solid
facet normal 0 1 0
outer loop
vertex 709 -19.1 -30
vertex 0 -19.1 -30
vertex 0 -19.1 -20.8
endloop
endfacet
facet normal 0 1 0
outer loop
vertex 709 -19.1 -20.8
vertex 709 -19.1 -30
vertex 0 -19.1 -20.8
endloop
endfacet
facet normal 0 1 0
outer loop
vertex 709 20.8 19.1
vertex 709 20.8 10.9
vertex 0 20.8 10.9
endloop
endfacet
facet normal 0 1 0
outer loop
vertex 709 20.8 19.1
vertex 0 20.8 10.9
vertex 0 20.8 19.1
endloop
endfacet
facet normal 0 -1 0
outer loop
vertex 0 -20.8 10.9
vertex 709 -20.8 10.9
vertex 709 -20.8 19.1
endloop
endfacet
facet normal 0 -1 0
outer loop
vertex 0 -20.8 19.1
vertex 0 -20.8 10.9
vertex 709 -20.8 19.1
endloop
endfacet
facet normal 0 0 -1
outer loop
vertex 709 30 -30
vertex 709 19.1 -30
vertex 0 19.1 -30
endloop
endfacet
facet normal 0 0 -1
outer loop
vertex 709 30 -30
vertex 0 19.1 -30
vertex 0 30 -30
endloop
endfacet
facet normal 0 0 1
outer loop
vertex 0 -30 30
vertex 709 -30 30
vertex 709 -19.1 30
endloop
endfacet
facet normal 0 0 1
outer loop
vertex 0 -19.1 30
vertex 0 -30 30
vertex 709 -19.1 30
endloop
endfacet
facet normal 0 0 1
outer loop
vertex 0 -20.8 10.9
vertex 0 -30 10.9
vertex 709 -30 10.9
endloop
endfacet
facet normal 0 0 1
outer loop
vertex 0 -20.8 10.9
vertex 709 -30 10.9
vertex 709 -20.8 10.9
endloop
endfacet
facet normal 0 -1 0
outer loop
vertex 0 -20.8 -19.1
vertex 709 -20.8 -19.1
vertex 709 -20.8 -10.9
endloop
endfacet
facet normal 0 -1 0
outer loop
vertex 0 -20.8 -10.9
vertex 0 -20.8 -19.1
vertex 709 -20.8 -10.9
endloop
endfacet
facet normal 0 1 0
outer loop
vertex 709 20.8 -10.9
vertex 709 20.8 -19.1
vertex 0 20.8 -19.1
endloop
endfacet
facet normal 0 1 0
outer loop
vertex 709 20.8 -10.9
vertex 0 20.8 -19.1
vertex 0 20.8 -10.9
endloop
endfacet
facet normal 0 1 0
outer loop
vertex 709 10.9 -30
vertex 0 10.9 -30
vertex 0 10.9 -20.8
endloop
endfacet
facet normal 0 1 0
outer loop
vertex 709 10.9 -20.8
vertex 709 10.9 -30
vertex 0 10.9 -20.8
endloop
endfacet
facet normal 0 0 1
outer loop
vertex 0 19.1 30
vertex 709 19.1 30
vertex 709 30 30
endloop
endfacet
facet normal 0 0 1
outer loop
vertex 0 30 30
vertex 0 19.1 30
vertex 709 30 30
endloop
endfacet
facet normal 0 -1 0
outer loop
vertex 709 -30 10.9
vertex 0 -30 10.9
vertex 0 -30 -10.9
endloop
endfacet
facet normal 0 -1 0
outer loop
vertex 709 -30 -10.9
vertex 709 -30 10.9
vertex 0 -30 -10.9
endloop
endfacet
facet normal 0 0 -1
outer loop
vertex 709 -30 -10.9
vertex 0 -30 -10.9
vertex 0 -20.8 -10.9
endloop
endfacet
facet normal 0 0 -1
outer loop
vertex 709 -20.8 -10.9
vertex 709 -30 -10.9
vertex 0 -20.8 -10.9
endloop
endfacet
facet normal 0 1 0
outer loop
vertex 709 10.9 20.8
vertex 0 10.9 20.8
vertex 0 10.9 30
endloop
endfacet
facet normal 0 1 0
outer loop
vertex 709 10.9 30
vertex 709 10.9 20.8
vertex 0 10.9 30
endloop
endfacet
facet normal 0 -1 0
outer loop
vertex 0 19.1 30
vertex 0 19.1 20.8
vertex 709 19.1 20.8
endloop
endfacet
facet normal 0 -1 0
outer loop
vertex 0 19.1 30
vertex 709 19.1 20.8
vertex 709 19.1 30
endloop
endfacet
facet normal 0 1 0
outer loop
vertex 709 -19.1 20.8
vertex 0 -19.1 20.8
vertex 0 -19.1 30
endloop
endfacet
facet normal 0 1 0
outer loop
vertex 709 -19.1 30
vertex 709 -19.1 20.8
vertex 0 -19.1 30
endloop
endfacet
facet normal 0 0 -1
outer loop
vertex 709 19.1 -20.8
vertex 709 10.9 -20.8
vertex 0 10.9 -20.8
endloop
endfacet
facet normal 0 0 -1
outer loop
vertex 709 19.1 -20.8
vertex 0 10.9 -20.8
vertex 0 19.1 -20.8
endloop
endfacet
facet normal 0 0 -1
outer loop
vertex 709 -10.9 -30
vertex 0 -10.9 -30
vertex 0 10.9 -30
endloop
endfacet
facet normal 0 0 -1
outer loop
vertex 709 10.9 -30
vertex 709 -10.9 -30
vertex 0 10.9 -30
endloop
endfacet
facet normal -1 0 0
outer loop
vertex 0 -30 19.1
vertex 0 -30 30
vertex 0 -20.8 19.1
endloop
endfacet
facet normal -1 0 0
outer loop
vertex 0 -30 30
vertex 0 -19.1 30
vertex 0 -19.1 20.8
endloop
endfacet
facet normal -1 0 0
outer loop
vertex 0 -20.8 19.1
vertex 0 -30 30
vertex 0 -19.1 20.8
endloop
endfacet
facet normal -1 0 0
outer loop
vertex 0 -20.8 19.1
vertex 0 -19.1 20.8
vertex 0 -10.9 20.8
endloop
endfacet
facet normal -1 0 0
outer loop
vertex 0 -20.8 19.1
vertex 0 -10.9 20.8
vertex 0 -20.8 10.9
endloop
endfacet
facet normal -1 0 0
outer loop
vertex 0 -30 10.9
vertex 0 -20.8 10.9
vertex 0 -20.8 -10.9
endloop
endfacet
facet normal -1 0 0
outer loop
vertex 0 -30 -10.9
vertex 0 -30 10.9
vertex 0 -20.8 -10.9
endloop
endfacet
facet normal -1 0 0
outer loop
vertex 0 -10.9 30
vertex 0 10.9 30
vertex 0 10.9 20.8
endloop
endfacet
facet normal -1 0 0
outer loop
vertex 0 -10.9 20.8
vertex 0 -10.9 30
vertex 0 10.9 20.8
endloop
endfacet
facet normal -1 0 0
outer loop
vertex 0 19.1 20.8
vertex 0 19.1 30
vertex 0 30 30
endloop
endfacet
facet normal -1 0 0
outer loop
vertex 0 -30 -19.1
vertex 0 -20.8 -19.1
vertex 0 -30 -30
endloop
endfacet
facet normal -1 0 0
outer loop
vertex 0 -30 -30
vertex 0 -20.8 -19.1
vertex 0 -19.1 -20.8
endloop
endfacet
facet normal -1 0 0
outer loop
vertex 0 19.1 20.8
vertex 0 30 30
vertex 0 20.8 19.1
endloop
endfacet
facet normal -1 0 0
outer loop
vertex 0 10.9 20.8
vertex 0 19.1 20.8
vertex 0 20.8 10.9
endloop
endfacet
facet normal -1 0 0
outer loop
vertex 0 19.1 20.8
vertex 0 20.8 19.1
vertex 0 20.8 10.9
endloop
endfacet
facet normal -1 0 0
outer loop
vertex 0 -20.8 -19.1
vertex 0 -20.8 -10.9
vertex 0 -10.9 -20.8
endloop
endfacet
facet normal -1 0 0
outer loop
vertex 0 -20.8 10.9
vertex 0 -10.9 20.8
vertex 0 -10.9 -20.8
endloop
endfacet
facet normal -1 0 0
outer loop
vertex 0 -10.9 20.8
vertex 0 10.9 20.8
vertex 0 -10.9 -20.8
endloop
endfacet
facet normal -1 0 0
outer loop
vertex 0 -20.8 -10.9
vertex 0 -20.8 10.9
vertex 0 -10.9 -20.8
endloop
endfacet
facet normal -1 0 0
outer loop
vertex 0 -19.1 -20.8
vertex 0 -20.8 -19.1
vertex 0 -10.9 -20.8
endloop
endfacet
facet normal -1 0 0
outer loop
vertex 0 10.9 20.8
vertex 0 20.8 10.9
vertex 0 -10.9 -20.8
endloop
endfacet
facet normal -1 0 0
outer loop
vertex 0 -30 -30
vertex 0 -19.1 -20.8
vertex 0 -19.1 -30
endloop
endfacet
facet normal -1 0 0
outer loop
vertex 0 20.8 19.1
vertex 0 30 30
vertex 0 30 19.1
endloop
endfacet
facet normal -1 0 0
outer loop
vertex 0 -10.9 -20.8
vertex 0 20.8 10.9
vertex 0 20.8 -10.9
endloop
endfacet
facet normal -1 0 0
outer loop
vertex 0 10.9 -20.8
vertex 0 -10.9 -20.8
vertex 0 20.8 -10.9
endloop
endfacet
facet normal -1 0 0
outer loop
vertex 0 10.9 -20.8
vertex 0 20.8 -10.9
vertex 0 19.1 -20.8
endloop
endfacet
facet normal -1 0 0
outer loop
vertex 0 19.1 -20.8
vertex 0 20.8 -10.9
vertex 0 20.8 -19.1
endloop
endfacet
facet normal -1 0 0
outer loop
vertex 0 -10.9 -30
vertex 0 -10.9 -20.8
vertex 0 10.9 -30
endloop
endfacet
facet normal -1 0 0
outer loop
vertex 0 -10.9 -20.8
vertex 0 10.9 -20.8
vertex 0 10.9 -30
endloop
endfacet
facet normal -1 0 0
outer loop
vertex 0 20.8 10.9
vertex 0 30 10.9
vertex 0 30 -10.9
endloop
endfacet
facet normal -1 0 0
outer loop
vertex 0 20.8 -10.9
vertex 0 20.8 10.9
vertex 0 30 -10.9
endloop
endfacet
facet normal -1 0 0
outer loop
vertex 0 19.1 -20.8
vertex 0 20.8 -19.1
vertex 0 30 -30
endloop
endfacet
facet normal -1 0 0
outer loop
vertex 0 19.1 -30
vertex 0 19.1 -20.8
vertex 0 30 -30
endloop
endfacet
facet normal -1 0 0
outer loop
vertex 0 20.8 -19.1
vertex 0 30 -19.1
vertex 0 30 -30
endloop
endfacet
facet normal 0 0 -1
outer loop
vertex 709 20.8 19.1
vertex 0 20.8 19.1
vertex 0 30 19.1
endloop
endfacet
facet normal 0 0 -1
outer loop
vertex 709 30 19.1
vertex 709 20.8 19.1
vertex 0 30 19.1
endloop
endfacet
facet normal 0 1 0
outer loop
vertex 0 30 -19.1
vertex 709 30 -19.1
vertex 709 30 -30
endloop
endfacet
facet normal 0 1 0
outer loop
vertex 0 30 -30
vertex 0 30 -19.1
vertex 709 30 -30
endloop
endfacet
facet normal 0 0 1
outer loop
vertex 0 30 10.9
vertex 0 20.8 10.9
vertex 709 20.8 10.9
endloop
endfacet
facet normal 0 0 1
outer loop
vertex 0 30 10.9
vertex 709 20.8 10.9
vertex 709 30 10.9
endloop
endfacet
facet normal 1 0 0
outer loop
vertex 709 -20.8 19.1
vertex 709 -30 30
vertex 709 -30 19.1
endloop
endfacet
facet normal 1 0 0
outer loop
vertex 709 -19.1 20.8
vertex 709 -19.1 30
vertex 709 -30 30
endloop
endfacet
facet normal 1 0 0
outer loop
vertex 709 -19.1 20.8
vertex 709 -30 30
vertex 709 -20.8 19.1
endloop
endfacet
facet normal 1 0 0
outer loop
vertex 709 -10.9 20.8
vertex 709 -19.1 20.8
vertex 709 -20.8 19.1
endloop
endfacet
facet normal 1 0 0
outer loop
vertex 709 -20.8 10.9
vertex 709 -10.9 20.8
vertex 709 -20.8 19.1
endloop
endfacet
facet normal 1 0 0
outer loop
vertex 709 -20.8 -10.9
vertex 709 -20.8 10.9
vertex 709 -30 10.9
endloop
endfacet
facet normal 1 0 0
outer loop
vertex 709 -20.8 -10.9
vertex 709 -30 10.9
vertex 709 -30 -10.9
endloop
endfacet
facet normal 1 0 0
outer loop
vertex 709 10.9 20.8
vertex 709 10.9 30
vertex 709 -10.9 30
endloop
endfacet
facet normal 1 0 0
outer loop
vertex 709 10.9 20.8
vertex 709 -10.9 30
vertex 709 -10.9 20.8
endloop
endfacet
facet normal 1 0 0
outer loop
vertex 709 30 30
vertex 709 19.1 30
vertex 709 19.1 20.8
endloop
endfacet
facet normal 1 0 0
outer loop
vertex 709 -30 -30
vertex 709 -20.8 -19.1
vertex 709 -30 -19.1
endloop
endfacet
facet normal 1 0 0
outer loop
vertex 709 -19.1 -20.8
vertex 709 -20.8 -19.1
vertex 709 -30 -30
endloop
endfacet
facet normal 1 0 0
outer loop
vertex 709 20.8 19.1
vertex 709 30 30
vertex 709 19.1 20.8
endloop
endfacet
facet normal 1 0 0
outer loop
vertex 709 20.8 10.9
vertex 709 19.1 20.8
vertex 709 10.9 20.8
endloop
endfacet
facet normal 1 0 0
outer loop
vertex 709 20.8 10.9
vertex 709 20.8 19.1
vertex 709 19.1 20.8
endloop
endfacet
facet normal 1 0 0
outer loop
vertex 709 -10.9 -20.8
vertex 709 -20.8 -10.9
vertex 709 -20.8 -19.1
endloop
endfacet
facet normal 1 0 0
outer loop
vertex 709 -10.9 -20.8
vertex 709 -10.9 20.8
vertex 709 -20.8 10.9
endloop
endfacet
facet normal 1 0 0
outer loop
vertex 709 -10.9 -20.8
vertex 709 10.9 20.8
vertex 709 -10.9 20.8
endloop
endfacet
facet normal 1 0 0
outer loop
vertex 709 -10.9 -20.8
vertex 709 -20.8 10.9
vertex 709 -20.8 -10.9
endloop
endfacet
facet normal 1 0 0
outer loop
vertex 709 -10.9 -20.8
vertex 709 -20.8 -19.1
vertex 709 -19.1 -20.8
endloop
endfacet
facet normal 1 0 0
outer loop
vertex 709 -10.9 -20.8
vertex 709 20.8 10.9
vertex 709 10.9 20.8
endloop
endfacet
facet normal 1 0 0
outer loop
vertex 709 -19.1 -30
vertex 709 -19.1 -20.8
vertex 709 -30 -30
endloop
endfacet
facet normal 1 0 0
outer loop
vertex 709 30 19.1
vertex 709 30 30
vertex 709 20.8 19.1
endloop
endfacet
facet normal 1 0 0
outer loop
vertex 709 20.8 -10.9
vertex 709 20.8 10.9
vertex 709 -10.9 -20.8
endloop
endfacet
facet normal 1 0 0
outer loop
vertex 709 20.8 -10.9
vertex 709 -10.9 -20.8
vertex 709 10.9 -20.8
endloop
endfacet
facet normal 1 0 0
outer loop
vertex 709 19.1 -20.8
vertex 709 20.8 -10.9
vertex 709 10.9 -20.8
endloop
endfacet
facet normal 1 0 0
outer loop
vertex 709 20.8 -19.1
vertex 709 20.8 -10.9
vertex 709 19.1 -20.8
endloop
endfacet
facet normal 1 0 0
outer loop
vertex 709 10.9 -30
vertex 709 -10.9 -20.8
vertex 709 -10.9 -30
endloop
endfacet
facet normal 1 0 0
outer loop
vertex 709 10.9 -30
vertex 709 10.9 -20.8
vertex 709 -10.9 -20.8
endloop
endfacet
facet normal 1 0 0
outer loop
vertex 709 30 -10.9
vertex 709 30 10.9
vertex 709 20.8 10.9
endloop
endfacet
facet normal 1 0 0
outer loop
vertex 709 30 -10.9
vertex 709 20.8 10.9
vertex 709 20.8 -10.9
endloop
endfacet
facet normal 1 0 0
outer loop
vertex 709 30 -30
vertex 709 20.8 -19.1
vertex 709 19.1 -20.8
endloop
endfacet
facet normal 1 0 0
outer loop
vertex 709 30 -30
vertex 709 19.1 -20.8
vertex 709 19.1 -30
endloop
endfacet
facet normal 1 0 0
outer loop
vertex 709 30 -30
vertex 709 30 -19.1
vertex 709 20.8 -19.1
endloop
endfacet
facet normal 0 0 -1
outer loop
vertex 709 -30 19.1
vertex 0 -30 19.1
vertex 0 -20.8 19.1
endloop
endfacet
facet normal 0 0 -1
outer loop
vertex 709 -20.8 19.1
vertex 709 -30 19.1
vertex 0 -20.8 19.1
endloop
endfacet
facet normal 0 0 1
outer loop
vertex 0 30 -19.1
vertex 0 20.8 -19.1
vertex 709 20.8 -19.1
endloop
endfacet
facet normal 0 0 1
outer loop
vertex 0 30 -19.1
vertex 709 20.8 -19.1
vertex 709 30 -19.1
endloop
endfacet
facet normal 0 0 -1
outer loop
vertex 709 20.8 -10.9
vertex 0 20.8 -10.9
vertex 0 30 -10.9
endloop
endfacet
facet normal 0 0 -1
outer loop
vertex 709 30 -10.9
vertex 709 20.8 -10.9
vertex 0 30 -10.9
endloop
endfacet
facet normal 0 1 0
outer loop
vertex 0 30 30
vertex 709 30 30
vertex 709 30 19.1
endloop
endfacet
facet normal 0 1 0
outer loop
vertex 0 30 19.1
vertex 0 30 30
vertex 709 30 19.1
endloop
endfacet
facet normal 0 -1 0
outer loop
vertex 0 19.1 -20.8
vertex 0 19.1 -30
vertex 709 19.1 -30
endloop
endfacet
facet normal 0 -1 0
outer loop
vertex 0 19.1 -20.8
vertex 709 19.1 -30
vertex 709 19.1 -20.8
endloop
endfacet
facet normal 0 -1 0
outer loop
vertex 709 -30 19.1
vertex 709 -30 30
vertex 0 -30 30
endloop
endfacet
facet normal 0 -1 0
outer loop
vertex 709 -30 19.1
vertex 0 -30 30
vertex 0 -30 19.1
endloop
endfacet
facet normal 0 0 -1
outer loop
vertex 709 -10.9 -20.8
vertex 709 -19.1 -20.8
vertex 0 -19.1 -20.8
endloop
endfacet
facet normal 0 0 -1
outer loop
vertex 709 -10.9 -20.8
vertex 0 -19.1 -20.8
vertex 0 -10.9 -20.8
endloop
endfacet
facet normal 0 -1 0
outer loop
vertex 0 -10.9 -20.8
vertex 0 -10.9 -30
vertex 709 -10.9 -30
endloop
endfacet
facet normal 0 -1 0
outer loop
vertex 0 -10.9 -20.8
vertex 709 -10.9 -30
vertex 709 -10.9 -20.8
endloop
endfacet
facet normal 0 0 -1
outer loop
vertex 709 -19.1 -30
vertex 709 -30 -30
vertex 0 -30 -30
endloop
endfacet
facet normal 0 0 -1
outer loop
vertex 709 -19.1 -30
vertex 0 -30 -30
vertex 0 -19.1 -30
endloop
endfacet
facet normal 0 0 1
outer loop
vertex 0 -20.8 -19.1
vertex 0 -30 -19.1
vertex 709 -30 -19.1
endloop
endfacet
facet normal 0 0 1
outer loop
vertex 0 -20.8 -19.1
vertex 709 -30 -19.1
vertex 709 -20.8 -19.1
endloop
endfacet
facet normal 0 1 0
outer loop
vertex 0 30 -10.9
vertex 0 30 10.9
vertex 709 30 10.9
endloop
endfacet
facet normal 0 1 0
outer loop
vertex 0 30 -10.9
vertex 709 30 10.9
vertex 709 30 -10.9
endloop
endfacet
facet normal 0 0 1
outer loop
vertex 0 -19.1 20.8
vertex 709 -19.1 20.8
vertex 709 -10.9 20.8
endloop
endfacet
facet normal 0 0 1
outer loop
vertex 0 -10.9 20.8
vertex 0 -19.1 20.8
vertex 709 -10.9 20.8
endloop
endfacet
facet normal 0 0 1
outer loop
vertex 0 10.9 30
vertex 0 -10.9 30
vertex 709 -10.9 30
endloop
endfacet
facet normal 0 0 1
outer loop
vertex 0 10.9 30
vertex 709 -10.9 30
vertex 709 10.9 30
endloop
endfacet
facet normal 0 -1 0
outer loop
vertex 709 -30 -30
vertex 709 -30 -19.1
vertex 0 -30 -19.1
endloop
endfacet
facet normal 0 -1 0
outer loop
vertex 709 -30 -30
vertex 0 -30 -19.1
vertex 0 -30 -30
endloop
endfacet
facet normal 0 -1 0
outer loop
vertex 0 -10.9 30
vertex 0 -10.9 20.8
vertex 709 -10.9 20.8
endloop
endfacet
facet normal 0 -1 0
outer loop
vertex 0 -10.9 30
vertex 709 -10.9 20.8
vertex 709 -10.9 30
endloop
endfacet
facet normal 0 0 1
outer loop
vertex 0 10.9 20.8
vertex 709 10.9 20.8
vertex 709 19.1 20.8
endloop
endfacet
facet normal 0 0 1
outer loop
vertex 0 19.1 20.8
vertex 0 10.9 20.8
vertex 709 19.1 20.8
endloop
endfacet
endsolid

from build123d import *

# Parameters (mm, degrees)
SKETCH_1_W          = 60
SKETCH_1_H          = 60
EXTRUDE_1_DEPTH     = 709
SKETCH_2_W          = 8.2
SKETCH_2_H          = 9.2
SKETCH_2_W_2        = 9.2
SKETCH_2_H_2        = 8.2
CUT_EXTRUDE_1_DEPTH = 710


with BuildPart() as part:
    # 草图1 → 凸台-拉伸1 (new body)
    with BuildSketch(Plane(origin=(0, 0, 0), x_dir=(0, 0, -1), z_dir=(1, 0, 0))):
        Rectangle(SKETCH_1_W, SKETCH_1_H)
    extrude(amount=EXTRUDE_1_DEPTH)

    # 草图2 → 切除-拉伸1 (cut, through all)
    with BuildSketch(Plane.ZY):
        with Locations((-15, 25.4)):
            Rectangle(SKETCH_2_W, SKETCH_2_H)
        with Locations((-15, -25.4)):
            Rectangle(SKETCH_2_W, SKETCH_2_H)
        with Locations((15, -25.4)):
            Rectangle(SKETCH_2_W, SKETCH_2_H)
        with Locations((15, 25.4)):
            Rectangle(SKETCH_2_W, SKETCH_2_H)
        with Locations((-25.4, 15)):
            Rectangle(SKETCH_2_W_2, SKETCH_2_H_2)
        with Locations((-25.4, -15)):
            Rectangle(SKETCH_2_W_2, SKETCH_2_H_2)
        with Locations((25.4, -15)):
            Rectangle(SKETCH_2_W_2, SKETCH_2_H_2)
        with Locations((25.4, 15)):
            Rectangle(SKETCH_2_W_2, SKETCH_2_H_2)
    extrude(amount=-CUT_EXTRUDE_1_DEPTH, mode=Mode.SUBTRACT)


solid = part.part
